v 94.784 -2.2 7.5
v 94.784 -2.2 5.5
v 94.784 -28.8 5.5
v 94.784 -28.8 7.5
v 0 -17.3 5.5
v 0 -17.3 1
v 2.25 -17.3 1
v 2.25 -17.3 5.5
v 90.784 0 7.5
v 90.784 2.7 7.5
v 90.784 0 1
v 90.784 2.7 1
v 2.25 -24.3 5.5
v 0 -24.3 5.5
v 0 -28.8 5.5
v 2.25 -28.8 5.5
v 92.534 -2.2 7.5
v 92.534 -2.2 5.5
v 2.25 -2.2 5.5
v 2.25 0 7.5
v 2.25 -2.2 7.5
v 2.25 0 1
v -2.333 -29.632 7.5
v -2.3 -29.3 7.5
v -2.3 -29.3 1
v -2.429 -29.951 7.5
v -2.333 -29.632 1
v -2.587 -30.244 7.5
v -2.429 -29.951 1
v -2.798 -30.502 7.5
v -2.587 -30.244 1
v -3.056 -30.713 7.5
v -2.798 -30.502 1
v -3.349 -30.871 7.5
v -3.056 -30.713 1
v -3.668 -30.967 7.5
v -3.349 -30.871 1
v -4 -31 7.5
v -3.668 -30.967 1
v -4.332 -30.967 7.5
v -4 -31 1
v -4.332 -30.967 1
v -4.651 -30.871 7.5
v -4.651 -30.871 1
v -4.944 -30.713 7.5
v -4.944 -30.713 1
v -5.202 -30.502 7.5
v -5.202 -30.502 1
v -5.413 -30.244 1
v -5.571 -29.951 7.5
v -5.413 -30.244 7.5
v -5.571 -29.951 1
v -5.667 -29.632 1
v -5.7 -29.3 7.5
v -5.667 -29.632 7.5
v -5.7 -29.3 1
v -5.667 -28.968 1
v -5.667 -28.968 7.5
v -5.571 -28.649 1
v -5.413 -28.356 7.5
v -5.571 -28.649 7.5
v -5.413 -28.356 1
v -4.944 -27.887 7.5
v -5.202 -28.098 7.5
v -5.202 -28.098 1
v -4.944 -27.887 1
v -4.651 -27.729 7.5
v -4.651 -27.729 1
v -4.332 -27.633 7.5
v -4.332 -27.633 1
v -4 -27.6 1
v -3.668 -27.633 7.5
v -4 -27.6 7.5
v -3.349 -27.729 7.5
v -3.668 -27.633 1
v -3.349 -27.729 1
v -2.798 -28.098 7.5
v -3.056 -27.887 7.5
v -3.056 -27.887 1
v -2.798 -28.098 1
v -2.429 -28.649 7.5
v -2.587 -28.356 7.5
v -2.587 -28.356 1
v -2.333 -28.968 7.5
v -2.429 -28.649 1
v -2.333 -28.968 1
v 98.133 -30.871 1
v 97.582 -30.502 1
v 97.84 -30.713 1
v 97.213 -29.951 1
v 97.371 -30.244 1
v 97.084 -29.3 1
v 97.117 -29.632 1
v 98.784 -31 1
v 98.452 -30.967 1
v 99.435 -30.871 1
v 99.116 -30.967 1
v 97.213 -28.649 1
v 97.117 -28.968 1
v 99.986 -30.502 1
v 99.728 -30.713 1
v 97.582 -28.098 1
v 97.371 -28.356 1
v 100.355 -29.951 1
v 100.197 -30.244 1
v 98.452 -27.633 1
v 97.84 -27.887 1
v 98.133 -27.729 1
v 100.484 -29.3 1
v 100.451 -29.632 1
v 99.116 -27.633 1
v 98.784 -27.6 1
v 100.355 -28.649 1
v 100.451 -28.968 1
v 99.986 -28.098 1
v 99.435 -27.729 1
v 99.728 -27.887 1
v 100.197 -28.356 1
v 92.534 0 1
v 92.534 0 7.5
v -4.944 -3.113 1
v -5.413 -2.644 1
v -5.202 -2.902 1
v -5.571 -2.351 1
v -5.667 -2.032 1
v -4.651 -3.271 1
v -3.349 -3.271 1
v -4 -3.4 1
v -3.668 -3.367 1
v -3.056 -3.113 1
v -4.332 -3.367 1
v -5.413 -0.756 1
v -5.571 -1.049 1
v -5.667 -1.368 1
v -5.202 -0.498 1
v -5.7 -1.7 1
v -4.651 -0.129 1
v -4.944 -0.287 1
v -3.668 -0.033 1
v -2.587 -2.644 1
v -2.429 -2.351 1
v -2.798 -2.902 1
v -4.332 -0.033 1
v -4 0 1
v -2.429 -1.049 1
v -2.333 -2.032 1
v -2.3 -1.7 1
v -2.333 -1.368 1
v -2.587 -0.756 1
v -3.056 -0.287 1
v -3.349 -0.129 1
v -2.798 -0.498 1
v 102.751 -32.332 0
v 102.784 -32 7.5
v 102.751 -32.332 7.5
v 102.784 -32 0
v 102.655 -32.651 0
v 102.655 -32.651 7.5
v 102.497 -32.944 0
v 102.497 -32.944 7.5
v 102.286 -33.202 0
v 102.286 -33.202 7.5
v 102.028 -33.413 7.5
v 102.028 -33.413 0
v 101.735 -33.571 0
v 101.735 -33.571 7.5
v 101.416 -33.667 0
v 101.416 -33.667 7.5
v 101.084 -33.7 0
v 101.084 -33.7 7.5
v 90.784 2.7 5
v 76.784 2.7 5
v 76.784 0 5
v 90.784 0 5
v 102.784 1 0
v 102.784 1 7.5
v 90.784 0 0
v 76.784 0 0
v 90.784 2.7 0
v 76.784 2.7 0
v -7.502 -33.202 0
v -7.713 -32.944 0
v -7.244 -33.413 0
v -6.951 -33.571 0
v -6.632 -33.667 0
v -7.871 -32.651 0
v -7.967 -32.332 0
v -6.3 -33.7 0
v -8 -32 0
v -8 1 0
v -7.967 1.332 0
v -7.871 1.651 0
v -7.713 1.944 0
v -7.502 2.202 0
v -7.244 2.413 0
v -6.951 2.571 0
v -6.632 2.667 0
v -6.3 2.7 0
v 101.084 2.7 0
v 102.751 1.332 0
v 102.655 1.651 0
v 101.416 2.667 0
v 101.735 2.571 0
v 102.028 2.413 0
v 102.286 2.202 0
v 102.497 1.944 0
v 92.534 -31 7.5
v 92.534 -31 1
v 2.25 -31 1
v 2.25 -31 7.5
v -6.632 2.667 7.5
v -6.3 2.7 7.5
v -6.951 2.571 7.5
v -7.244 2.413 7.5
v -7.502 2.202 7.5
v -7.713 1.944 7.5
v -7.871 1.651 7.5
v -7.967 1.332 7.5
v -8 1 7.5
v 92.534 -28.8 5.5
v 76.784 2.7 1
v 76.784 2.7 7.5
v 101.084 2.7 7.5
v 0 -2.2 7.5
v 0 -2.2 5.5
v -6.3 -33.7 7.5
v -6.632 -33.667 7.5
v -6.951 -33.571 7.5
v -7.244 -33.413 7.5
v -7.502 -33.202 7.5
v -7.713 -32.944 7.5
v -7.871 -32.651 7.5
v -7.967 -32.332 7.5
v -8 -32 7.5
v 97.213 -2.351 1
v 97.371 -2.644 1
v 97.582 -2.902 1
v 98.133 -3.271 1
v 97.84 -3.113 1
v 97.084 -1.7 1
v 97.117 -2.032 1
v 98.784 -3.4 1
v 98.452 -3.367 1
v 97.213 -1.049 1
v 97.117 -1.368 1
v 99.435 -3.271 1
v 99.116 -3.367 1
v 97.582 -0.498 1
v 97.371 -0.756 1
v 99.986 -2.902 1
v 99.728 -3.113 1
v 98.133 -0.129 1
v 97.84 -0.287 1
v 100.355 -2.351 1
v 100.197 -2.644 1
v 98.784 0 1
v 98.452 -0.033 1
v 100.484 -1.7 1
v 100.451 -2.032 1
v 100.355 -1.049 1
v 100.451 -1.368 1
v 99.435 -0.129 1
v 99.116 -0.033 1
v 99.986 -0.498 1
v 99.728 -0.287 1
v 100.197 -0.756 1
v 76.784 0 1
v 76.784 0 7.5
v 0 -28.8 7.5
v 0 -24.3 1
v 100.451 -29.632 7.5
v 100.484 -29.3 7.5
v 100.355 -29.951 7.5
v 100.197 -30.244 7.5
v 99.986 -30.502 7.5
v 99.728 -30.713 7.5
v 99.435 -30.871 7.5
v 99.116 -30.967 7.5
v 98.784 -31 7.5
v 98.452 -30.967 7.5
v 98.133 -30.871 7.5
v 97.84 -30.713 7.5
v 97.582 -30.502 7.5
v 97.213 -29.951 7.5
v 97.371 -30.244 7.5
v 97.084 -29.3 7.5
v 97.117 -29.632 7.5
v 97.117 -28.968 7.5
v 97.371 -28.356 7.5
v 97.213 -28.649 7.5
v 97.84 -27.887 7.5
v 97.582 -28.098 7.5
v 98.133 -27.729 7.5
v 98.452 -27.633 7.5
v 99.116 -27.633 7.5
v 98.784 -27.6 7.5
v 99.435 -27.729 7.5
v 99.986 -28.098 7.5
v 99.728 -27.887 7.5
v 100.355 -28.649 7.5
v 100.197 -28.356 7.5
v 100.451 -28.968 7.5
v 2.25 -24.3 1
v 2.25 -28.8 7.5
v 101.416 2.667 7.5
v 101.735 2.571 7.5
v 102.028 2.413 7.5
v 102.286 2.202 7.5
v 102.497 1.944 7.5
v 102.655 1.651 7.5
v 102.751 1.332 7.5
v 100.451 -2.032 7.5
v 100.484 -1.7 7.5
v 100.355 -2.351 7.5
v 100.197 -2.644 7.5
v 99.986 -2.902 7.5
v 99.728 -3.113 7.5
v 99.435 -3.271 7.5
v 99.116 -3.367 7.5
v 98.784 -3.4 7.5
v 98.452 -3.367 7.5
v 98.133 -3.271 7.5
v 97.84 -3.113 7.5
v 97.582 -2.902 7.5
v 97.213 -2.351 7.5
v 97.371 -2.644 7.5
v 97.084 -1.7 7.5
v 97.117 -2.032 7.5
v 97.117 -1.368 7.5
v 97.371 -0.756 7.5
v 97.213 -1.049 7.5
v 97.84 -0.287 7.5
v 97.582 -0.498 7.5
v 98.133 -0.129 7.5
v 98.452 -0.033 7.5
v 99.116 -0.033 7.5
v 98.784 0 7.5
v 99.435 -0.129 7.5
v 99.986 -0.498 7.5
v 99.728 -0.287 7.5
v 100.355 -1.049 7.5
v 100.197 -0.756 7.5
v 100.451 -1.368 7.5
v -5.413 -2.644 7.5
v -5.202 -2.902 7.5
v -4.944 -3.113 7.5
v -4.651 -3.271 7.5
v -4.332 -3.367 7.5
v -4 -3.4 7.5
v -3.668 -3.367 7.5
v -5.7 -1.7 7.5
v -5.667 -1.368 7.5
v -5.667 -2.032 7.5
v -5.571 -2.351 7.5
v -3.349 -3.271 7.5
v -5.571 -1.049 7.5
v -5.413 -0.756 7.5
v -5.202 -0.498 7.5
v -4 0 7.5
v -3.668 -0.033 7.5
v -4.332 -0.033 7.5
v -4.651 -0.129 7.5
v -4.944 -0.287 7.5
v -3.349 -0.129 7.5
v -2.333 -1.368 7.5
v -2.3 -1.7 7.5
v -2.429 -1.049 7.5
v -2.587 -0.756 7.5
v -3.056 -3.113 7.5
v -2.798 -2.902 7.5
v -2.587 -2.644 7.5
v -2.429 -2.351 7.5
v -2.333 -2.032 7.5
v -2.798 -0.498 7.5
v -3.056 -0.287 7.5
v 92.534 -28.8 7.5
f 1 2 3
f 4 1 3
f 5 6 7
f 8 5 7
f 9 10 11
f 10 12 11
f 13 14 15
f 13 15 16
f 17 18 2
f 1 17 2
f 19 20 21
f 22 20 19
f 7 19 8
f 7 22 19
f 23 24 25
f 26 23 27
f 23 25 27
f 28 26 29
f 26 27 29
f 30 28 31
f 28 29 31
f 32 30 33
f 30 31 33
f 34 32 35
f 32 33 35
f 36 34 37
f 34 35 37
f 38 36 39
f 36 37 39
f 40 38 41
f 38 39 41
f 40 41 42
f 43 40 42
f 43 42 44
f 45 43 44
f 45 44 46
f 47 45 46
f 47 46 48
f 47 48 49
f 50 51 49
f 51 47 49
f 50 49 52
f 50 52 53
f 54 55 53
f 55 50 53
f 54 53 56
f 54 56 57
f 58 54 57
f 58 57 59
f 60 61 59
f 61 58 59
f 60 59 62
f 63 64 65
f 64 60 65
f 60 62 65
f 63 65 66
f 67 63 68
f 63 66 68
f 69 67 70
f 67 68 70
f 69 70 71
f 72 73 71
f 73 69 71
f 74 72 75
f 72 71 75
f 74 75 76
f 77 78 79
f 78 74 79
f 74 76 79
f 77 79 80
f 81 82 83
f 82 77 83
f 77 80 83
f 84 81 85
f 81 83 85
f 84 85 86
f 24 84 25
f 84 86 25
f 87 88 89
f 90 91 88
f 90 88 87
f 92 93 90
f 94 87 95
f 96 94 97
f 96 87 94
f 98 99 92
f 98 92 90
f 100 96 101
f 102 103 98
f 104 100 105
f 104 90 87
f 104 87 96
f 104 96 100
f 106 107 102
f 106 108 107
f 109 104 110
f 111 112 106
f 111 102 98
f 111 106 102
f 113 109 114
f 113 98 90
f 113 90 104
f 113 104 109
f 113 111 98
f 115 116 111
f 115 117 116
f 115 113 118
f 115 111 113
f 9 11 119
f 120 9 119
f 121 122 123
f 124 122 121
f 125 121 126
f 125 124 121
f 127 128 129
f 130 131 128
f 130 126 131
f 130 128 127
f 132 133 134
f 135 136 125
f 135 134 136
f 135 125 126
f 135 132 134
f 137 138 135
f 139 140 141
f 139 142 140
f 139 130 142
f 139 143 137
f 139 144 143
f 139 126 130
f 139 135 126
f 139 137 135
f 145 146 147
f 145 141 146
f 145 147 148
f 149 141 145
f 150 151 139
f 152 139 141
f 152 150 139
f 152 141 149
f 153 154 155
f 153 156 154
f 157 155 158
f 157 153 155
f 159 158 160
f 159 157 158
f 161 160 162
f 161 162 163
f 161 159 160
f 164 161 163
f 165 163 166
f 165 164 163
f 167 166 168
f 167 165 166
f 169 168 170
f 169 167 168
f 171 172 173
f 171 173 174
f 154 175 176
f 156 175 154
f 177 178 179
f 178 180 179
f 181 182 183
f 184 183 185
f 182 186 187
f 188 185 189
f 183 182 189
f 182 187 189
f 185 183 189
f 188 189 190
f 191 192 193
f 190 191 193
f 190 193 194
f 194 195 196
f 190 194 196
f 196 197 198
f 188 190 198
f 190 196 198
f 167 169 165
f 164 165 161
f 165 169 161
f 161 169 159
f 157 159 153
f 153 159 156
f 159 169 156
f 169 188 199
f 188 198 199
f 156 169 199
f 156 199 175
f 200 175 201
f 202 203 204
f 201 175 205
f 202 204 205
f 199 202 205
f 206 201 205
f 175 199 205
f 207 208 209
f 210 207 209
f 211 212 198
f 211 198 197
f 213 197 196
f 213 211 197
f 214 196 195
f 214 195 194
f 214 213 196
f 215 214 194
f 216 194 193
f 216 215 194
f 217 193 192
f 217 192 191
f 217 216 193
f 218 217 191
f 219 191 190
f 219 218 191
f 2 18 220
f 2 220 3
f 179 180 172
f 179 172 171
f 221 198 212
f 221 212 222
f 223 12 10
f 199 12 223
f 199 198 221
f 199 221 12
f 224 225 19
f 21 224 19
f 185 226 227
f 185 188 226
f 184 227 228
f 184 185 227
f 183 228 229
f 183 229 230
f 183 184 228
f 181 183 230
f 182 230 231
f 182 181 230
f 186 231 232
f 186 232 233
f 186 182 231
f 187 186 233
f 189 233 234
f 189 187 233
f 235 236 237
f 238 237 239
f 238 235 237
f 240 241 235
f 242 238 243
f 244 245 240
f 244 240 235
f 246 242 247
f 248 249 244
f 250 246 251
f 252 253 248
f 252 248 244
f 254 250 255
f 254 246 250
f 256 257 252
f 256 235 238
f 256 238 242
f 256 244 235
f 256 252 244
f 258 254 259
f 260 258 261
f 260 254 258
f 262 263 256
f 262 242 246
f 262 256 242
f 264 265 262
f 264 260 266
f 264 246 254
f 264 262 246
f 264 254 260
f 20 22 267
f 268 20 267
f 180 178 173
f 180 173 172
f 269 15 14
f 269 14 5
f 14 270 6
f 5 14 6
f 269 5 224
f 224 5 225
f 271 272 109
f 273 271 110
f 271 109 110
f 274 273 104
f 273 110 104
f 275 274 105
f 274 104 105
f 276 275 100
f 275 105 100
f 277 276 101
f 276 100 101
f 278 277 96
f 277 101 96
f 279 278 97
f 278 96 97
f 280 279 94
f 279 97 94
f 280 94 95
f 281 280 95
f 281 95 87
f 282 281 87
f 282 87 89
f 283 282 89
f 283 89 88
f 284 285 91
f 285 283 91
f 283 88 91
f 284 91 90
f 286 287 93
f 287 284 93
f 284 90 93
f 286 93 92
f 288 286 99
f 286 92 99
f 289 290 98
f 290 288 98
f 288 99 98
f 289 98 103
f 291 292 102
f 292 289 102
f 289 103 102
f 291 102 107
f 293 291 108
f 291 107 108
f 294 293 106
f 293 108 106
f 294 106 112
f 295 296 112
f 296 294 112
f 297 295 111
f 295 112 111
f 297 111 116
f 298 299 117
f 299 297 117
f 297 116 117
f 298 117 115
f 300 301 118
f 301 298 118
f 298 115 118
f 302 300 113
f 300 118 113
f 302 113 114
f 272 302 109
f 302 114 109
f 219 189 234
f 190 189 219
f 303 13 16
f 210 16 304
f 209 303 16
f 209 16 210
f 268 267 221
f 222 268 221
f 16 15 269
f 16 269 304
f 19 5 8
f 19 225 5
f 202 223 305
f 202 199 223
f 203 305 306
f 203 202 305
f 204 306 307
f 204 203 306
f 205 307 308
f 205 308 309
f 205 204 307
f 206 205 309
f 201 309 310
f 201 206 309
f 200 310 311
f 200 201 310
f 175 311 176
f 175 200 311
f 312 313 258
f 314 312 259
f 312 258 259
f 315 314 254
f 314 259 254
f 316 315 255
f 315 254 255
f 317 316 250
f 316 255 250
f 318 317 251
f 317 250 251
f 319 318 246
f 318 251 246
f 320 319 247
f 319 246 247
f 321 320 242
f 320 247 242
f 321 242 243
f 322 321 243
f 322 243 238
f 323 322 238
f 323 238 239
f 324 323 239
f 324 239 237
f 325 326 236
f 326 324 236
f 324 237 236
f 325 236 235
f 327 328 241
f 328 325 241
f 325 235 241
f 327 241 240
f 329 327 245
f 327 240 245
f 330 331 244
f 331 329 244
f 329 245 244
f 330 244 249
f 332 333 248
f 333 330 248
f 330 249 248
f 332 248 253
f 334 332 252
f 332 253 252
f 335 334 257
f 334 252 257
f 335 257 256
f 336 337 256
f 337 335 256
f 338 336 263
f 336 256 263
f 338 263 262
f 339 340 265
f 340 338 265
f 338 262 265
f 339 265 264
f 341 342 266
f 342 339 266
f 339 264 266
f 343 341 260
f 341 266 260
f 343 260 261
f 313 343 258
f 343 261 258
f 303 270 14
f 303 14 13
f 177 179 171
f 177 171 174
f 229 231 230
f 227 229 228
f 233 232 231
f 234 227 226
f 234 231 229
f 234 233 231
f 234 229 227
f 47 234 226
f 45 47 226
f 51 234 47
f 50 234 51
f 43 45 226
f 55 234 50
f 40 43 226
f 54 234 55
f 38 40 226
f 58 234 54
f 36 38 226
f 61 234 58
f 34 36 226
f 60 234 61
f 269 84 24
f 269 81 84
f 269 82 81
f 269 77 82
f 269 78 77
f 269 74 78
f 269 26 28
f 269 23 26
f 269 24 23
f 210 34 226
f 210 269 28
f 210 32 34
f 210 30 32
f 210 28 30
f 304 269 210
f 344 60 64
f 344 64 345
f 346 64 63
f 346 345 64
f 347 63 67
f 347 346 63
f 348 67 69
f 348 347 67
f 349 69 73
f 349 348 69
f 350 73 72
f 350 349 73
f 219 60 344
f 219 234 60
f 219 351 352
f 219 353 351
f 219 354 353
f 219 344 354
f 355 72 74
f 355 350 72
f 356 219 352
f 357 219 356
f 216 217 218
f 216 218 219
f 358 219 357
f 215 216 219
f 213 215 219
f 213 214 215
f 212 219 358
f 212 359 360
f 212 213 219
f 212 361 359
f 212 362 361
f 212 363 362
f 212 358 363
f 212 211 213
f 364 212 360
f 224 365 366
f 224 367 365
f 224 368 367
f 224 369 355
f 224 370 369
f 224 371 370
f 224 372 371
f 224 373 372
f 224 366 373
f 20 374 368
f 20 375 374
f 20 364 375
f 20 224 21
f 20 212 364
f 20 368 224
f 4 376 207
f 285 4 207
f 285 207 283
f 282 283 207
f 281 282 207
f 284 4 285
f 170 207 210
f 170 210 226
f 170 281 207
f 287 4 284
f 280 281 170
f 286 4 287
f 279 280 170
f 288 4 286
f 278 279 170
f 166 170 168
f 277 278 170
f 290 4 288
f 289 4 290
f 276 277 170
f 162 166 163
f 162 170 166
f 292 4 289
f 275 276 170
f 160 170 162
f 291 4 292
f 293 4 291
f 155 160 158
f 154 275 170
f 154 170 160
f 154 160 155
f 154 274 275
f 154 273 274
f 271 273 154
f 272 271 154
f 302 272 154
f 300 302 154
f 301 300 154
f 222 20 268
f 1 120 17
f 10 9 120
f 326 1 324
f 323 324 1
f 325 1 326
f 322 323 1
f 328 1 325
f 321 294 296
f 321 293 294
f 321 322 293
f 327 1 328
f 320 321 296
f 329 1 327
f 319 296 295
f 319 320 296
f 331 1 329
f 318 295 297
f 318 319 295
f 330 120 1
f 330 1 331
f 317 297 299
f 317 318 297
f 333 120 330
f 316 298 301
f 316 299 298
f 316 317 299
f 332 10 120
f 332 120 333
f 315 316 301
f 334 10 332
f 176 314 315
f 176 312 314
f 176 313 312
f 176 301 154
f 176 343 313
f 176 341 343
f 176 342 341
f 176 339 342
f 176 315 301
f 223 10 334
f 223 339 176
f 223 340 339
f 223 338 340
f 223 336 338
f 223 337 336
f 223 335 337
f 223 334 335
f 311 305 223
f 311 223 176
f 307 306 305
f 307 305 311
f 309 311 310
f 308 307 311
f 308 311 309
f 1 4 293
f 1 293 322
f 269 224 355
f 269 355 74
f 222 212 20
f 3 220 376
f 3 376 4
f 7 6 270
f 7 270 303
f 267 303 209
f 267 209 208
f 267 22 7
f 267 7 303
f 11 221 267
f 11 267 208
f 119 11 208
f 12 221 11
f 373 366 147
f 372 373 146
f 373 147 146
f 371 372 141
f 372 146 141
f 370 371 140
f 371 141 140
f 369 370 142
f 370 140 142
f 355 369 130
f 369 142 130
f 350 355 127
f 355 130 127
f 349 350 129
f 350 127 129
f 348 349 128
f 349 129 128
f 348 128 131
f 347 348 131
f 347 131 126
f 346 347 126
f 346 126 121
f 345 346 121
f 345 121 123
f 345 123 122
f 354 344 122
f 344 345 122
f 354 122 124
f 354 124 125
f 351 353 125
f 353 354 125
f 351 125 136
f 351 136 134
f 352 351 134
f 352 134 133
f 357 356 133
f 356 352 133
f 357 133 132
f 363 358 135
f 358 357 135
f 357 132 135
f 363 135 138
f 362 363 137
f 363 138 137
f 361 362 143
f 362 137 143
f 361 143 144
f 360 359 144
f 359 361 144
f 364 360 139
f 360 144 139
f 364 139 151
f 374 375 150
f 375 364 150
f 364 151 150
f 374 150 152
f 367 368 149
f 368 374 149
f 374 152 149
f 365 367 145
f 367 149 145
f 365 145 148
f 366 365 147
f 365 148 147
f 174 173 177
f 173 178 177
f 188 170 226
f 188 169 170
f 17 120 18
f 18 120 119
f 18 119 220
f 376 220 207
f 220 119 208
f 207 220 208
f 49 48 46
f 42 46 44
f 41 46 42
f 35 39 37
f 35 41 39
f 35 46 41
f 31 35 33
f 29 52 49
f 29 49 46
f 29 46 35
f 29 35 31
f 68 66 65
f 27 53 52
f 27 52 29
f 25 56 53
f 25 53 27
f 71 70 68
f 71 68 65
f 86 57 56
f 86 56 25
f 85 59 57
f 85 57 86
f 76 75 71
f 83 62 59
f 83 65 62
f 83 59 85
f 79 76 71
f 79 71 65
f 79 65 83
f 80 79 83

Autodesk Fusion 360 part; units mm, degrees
sketch "Sketch1" plane through (0, 0, 0) normal (0, 0, 1) x (1, 0, 0) in component "guilty pad case"
  line L0 (0, 0) -> (94.784, 0)
  line L1 (94.784, 0) -> (94.784, -31)
  line L2 (94.784, -31) -> (0, -31)
  line L3 (0, -31) -> (0, 0)
  line L4 (-8, 2.7) -> (102.784, 2.7)
  line L5 (102.784, 2.7) -> (102.784, -33.7)
  line L6 (102.784, -33.7) -> (-8, -33.7)
  line L7 (-8, -33.7) -> (-8, 2.7)
  circle A0 centre (-4, -29.3) radius 1.7
  circle A1 centre (98.784, -29.3) radius 1.7
  circle A2 centre (98.784, -1.7) radius 1.7
  circle A3 centre (-4, -1.7) radius 1.7
  line L8 (3, -31) -> (27, -31)
  line L9 (27, -33.7) -> (3, -33.7)
  line L10 (90.784, 0) -> (76.784, 0)
  line L11 (76.784, 0) -> (76.784, 2.7)
  line L12 (76.784, 2.7) -> (90.784, 2.7)
  line L13 (90.784, 2.7) -> (90.784, 0)
  line L14 (92.534, 0) -> (92.534, -31)
  line L15 (2.25, 0) -> (2.25, -31)
  line L16 (0, -2.2) -> (94.784, -2.2)
  line L17 (0, -28.8) -> (94.784, -28.8)
  line L18 (0, -24.3) -> (2.25, -24.3)
  line L19 (0, -17.3) -> (2.25, -17.3)
  dimension "d4" = 36.4
  dimension "d5" = 110.784
  dimension "d6" = 94.784
  dimension "d7" = 31
  dimension "d9" = 3.4
  dimension "d10" = 4.4
  dimension "d11" = 4
  dimension "d12" = 3.4
  dimension "d13" = 4
  dimension "d14" = 4.4
  dimension "d15" = 3.4
  dimension "d16" = 4.4
  dimension "d17" = 4
  dimension "d18" = 3.4
  dimension "d19" = 4.4
  dimension "d20" = 4
  dimension "d21" = 2.7
  dimension "d22" = 8
  dimension "d23" = 24
  dimension "d24" = 2.7
  dimension "d26" = 4
  dimension "d27" = 14
  dimension "d32" = 2.25
  dimension "d33" = 2.25
  dimension "d73" = 2.2
  dimension "d74" = 2.2
  dimension "d77" = 4.5
  dimension "d78" = 7
extrude "Extrude2" add sketch "Sketch1" along normal blind 7.5 contours L0 L1 L2 L3 L4 L5 L6 L7 L8 L9 L11 L13 | L0 L3 L15 L16 | L0 L1 L14 L16 | L1 L2 L14 L17 | L2 L3 L15 L17 makes body 1 in component "guilty pad case"
extrude "Extrude3" add sketch "Sketch1" along normal blind 5.5 separate body contours L0 L3 L15 L16 | L3 L15 L16 L19 | L1 L14 L16 L17 | L0 L1 L14 L16 | L3 L15 L17 L18 | L1 L2 L14 L17 | L2 L3 L15 L17 makes body 2 at (0, -11.5333, 1.8333) makes body 3 at (94.784, -10.3333, 1.8333) makes body 4 at (0, -28.7667, 1.8333) in component "guilty pad case"
extrude "Extrude9" add sketch "Sketch1" along normal blind 1 contours L0 L1 L2 L3 L4 L5 L6 L7 L8 L9 L11 L13 | L0 L3 L15 L16 | L0 L10 L14 L15 L16 | L3 L15 L16 L19 | L0 L4 L10 L11 L12 L13 | L14 L15 L16 L17 | L3 L15 L18 L19 | L1 L14 L16 L17 | L0 L1 L14 L16 | L3 L15 L17 L18 | L1 L2 L14 L17 | L2 L8 L14 L15 L17 | L2 L3 L15 L17 | A0 | A1 | A2 | A3 bodies 2 4 1 3 in component "guilty pad case"
fillet "Fillet2" radius 1.7 4 edges at (-8, -33.7, 3.75) (-8, 2.7, 3.75) (102.784, 2.7, 3.75) (102.784, -33.7, 3.75) on bodies 2 in component "guilty pad case"
extrude "Extrude13" add sketch "Sketch1" along normal blind 5 separate body contours L0 L4 L10 L11 L12 L13 makes body 5 in component "guilty pad case"
component "guilty pad case" placed x (1, 0, 0) y (0, 1, 0) z (0, 0, 1) at (0, 0, 0)
